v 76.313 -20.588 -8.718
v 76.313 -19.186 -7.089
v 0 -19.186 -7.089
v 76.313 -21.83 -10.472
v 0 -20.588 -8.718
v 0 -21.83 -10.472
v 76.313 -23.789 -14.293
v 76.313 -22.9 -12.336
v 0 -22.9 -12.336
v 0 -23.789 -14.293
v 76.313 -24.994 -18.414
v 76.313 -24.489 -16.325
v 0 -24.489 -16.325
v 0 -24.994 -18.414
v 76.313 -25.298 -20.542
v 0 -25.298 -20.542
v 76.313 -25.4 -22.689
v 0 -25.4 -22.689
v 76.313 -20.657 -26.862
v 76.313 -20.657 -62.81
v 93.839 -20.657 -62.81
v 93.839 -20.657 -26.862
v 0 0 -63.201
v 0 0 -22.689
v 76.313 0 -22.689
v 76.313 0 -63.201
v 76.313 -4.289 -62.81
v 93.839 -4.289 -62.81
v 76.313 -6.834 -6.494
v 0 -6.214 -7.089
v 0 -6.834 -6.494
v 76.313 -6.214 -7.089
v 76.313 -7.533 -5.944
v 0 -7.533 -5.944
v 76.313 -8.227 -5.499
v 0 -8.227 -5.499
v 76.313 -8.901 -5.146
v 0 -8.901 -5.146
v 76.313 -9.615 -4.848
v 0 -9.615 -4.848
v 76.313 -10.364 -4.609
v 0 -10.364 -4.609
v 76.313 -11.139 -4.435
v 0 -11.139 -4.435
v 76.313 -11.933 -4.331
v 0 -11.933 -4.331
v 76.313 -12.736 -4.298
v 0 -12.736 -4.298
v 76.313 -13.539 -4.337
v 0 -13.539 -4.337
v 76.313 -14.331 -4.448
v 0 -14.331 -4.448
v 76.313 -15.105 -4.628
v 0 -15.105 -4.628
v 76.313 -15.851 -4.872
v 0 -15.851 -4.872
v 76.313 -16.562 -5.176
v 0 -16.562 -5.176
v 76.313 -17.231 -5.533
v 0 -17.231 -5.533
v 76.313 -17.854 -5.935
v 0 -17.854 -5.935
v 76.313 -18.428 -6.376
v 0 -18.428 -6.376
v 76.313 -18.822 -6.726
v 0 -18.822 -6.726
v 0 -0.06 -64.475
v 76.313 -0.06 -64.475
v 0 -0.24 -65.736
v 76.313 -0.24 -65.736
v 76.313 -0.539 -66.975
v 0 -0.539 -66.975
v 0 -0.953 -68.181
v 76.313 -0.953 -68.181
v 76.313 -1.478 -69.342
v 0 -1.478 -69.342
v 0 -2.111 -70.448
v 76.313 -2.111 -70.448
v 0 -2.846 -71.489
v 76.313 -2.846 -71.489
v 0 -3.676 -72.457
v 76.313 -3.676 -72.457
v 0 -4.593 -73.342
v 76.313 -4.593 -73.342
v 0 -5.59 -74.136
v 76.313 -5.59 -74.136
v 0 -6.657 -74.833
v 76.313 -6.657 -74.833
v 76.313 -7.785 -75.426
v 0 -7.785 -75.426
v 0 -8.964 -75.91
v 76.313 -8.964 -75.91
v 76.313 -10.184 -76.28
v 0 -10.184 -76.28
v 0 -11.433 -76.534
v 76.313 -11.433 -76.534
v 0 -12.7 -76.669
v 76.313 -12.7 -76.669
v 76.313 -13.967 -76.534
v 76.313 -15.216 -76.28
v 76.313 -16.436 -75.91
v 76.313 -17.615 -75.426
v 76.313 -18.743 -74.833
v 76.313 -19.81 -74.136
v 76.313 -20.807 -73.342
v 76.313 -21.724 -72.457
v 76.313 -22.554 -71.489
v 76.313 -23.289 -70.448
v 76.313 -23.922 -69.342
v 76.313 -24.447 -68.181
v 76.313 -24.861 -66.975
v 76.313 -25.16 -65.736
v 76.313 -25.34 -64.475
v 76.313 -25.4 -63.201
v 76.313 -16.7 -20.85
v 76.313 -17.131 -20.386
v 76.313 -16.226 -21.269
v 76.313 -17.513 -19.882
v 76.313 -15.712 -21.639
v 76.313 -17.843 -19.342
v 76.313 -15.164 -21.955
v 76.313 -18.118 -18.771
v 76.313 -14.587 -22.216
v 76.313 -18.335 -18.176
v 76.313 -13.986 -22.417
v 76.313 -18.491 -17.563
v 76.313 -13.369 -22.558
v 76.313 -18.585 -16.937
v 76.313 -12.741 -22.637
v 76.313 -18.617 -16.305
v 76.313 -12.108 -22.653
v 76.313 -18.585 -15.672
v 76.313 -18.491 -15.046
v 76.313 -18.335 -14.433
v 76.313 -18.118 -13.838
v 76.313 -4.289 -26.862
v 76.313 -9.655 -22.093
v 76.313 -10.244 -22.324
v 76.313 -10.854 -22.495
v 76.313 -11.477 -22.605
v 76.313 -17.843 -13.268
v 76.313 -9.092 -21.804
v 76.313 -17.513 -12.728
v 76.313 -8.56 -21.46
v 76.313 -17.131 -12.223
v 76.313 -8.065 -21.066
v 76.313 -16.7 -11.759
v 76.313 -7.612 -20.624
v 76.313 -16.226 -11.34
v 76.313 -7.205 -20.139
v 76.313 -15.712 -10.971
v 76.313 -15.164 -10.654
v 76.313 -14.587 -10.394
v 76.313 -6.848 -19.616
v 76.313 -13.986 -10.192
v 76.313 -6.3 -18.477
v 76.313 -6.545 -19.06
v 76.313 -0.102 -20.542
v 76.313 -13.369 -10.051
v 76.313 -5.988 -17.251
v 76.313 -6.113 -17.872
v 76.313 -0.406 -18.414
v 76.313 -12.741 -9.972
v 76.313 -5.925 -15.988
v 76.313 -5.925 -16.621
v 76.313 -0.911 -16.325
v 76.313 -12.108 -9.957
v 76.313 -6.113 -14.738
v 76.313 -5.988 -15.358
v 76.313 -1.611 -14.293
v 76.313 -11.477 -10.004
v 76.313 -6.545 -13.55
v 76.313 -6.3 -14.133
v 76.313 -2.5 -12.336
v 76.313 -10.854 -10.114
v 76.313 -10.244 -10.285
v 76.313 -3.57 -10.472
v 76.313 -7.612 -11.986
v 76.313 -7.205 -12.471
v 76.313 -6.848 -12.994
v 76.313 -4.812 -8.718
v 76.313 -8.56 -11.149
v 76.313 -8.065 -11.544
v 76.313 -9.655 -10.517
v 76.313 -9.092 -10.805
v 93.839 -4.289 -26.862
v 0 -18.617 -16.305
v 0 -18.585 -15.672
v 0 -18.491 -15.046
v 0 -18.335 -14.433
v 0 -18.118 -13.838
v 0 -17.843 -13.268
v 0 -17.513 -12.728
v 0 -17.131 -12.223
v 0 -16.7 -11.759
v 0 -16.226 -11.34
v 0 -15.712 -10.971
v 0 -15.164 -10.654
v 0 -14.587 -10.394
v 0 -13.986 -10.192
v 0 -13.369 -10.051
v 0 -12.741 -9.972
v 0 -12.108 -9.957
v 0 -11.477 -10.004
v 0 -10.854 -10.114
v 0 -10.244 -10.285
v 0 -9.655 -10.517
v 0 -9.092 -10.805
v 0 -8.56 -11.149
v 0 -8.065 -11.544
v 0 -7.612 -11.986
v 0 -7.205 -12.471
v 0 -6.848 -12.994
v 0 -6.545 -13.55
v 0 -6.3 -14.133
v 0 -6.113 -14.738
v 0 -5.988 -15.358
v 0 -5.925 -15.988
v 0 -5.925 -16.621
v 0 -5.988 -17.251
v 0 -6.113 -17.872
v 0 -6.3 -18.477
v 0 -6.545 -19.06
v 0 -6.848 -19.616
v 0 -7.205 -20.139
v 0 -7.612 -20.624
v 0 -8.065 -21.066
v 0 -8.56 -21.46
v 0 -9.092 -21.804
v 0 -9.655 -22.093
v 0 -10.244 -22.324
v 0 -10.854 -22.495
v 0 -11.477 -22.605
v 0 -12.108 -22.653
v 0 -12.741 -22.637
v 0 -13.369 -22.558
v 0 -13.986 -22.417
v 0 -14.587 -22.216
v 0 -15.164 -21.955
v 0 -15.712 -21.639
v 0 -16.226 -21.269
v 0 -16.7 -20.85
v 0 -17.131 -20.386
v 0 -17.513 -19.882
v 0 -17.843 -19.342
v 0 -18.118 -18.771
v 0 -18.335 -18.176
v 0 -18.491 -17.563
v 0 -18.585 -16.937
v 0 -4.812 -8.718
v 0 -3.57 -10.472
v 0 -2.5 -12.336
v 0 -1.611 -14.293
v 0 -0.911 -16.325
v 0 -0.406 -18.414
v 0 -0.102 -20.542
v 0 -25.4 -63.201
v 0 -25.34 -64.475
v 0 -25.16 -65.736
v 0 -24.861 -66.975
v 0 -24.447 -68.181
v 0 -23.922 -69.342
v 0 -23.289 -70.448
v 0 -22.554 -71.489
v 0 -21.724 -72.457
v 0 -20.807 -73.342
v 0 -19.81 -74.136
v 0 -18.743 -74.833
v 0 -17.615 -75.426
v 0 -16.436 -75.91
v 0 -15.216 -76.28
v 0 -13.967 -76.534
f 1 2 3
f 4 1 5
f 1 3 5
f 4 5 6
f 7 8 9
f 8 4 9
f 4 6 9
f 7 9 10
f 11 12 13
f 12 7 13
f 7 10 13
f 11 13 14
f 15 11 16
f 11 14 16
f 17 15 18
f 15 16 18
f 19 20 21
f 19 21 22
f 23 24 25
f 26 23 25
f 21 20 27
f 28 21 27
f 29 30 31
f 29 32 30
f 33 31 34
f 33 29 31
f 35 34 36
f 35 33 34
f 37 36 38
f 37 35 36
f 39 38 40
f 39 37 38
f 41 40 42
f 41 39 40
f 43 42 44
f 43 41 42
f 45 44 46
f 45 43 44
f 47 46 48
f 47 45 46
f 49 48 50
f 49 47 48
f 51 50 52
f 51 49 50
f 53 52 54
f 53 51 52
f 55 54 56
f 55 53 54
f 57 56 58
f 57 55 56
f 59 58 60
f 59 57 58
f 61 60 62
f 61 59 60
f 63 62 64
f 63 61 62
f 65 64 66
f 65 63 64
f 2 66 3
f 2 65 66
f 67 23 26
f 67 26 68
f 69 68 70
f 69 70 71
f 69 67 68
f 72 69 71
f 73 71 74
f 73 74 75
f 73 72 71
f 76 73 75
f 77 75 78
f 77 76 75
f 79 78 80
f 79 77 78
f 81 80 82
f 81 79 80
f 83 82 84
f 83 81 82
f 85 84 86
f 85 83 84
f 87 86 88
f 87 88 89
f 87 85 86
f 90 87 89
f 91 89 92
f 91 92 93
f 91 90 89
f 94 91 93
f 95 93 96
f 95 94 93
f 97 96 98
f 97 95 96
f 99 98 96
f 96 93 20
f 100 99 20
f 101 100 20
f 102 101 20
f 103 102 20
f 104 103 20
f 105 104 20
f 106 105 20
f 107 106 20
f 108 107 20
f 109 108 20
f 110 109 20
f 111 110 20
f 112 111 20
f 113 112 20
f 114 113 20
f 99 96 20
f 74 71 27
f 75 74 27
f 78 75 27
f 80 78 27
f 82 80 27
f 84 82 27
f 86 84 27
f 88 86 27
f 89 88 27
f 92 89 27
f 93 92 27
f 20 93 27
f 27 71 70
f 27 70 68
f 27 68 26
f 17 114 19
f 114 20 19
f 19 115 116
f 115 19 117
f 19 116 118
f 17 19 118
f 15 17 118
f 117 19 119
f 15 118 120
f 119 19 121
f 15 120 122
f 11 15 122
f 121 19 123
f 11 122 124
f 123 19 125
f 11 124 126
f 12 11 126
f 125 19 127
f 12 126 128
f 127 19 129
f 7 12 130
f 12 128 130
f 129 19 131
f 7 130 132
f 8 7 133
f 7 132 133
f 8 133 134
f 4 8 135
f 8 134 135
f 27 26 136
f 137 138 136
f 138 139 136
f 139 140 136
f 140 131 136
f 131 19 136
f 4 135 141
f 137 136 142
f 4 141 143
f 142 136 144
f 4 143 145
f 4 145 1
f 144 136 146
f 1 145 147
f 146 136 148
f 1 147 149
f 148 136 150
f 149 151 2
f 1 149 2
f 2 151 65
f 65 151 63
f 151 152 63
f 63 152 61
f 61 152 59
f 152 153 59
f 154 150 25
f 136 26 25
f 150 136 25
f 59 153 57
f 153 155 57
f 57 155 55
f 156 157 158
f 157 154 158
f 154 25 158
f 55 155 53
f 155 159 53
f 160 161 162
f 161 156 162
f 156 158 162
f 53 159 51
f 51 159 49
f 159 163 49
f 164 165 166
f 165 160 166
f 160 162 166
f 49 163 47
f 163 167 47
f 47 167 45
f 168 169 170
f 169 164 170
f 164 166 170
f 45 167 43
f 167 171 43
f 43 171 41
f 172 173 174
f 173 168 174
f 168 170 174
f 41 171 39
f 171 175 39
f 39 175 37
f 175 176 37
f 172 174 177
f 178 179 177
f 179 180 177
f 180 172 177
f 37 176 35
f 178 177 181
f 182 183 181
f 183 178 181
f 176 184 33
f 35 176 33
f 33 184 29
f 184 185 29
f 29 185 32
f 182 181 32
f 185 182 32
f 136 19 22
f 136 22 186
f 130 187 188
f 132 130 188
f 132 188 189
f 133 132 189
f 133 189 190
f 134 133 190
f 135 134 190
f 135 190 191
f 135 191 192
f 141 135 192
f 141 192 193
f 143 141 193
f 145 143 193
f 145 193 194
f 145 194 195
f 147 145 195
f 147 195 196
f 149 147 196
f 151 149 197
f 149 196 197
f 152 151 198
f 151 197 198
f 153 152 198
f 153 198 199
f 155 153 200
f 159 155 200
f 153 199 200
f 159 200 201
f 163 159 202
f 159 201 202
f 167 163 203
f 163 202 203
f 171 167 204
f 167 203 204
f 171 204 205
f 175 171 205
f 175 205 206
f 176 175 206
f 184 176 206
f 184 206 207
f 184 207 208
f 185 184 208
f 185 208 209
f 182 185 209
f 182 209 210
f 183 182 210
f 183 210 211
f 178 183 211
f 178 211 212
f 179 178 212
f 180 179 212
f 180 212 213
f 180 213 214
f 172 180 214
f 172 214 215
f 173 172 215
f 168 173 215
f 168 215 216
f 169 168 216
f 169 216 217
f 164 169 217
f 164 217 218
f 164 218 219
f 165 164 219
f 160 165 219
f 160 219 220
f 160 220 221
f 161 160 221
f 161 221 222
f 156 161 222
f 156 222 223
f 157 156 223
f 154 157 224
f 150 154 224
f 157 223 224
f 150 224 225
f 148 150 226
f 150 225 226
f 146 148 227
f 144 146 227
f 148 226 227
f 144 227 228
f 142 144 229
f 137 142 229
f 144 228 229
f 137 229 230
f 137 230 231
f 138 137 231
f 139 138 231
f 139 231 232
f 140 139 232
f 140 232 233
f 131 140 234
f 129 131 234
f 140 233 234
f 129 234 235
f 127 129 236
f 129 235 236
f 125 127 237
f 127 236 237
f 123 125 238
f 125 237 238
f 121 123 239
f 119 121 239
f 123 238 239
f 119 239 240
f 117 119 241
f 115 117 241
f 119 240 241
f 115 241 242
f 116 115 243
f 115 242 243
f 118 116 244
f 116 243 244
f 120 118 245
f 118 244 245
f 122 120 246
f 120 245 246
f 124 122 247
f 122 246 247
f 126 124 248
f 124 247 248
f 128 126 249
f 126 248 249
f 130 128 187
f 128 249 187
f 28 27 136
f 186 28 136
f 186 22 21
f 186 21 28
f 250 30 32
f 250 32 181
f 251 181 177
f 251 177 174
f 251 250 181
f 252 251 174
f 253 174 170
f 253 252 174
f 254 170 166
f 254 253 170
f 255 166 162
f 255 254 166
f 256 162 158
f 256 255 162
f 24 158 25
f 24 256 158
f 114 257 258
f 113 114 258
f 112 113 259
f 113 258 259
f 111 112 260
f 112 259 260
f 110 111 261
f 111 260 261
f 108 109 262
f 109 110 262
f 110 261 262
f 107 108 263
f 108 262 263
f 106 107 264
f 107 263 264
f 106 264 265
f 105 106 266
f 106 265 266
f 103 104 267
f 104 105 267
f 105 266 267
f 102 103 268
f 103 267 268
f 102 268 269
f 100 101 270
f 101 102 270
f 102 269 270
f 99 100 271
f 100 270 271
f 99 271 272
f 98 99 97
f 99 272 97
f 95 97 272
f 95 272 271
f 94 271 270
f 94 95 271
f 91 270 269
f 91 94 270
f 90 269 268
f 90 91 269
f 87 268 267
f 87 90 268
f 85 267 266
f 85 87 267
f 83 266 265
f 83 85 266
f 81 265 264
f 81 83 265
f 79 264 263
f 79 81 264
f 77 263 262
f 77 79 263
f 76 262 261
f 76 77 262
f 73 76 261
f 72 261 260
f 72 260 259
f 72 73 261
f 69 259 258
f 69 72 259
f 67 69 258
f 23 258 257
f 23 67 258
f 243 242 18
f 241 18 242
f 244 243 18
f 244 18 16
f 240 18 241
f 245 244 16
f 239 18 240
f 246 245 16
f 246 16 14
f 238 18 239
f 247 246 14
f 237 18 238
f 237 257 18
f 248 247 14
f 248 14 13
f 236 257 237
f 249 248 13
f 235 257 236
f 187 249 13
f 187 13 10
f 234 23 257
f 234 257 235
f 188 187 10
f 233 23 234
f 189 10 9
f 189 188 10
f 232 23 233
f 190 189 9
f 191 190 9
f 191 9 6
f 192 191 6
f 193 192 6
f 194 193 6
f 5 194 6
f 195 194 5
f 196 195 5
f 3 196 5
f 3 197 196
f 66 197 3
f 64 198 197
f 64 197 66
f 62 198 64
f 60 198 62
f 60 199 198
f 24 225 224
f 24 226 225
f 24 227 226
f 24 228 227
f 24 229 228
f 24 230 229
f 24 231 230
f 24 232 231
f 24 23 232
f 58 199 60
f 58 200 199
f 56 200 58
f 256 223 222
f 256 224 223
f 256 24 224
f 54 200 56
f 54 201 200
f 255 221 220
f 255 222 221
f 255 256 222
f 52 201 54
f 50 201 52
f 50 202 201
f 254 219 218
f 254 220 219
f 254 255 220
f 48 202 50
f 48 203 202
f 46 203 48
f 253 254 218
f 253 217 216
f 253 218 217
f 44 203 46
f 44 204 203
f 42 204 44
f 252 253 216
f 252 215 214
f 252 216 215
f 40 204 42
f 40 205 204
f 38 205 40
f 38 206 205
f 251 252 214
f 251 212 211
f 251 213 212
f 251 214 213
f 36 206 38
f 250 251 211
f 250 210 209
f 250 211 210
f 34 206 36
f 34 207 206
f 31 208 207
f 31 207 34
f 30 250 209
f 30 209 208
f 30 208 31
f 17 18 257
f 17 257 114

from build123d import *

# Parameters (mm, degrees)
F0_W        = 76.3128548861
F0_H        = 76.6920521855
F1_DEPTH    = 25.4
F2_T1_DEPTH = 189.756750182
F3_T1_DEPTH = 143.7659818188
F4_R        = 8.9325225018
F6_D        = 12.7
F7_W        = 16.36798447
F7_H        = 35.9481759369
F8_DEPTH    = 17.526


# Not quite as in the source:
# - a fillet or chamfer that OpenCascade refuses, or shapes differently, is made with other operations: its cross-section is extruded or revolved along the edge and cut away or added


with BuildPart() as f1:
    # F0 (on Front) → F1 (new body)
    with BuildSketch(Plane.XZ):
        with Locations((38.156427443, -38.3460260928)):
            Rectangle(F0_W, F0_H)
    extrude(amount=F1_DEPTH)

    # F2: fillet of radius 22.6887790592 on 2 edges, made by hand

    # F2_s2 → F2_t1 (cut)
    with BuildSketch(Plane.YZ.offset(-56.721947648)):
        with BuildLine():
            ThreePointArc((-2.7112209408, 0), (-18.7546104704, -6.6453895296), (-25.4, -22.6887790592))
            Line((-25.4, -22.6887790592), (-25.4, 0))
            Line((-25.4, 0), (-2.7112209408, 0))
        make_face()
        with BuildLine():
            ThreePointArc((-22.6887790592, 0), (-6.6453895296, -6.6453895296), (0, -22.6887790592))
            Line((0, -22.6887790592), (0, 0))
            Line((0, 0), (-22.6887790592, 0))
        make_face()
    extrude(amount=F2_T1_DEPTH, mode=Mode.SUBTRACT)

    # F3: fillet of radius 13.4906253865 on 2 edges, made by hand

    # F3_s2 → F3_t1 (cut)
    with BuildSketch(Plane.YZ.offset(-33.7265634664)):
        with BuildLine():
            ThreePointArc((-25.4, -63.201426799), (-21.4486873067, -72.7407394923), (-11.9093746135, -76.6920521855))
            Line((-11.9093746135, -76.6920521855), (-25.4, -76.6920521855))
            Line((-25.4, -76.6920521855), (-25.4, -63.201426799))
        make_face()
        with BuildLine():
            ThreePointArc((0, -63.201426799), (-3.9513126933, -72.7407394923), (-13.4906253865, -76.6920521855))
            Line((-13.4906253865, -76.6920521855), (0, -76.6920521855))
            Line((0, -76.6920521855), (0, -63.201426799))
        make_face()
    extrude(amount=F3_T1_DEPTH, mode=Mode.SUBTRACT)

    # F4
    f4_edges = [f1.edges().sort_by_distance(p)[0] for p in [
        (38.156427, -12.7, -2.317108),
    ]]
    fillet(f4_edges, radius=F4_R)

    # F6 (through all)
    with Locations(Plane.YZ.offset(76.3128548861)):
        with Locations((-12.2666405514, -16.3046810776)):
            Hole(F6_D / 2)

    # F7 (on face) → F8 (join)
    with BuildSketch(Plane.YZ.offset(76.3128548861)):
        with Locations((-12.4732137192, -44.8362212628)):
            Rectangle(F7_W, F7_H)
    extrude(amount=F8_DEPTH)


solid = f1.part
